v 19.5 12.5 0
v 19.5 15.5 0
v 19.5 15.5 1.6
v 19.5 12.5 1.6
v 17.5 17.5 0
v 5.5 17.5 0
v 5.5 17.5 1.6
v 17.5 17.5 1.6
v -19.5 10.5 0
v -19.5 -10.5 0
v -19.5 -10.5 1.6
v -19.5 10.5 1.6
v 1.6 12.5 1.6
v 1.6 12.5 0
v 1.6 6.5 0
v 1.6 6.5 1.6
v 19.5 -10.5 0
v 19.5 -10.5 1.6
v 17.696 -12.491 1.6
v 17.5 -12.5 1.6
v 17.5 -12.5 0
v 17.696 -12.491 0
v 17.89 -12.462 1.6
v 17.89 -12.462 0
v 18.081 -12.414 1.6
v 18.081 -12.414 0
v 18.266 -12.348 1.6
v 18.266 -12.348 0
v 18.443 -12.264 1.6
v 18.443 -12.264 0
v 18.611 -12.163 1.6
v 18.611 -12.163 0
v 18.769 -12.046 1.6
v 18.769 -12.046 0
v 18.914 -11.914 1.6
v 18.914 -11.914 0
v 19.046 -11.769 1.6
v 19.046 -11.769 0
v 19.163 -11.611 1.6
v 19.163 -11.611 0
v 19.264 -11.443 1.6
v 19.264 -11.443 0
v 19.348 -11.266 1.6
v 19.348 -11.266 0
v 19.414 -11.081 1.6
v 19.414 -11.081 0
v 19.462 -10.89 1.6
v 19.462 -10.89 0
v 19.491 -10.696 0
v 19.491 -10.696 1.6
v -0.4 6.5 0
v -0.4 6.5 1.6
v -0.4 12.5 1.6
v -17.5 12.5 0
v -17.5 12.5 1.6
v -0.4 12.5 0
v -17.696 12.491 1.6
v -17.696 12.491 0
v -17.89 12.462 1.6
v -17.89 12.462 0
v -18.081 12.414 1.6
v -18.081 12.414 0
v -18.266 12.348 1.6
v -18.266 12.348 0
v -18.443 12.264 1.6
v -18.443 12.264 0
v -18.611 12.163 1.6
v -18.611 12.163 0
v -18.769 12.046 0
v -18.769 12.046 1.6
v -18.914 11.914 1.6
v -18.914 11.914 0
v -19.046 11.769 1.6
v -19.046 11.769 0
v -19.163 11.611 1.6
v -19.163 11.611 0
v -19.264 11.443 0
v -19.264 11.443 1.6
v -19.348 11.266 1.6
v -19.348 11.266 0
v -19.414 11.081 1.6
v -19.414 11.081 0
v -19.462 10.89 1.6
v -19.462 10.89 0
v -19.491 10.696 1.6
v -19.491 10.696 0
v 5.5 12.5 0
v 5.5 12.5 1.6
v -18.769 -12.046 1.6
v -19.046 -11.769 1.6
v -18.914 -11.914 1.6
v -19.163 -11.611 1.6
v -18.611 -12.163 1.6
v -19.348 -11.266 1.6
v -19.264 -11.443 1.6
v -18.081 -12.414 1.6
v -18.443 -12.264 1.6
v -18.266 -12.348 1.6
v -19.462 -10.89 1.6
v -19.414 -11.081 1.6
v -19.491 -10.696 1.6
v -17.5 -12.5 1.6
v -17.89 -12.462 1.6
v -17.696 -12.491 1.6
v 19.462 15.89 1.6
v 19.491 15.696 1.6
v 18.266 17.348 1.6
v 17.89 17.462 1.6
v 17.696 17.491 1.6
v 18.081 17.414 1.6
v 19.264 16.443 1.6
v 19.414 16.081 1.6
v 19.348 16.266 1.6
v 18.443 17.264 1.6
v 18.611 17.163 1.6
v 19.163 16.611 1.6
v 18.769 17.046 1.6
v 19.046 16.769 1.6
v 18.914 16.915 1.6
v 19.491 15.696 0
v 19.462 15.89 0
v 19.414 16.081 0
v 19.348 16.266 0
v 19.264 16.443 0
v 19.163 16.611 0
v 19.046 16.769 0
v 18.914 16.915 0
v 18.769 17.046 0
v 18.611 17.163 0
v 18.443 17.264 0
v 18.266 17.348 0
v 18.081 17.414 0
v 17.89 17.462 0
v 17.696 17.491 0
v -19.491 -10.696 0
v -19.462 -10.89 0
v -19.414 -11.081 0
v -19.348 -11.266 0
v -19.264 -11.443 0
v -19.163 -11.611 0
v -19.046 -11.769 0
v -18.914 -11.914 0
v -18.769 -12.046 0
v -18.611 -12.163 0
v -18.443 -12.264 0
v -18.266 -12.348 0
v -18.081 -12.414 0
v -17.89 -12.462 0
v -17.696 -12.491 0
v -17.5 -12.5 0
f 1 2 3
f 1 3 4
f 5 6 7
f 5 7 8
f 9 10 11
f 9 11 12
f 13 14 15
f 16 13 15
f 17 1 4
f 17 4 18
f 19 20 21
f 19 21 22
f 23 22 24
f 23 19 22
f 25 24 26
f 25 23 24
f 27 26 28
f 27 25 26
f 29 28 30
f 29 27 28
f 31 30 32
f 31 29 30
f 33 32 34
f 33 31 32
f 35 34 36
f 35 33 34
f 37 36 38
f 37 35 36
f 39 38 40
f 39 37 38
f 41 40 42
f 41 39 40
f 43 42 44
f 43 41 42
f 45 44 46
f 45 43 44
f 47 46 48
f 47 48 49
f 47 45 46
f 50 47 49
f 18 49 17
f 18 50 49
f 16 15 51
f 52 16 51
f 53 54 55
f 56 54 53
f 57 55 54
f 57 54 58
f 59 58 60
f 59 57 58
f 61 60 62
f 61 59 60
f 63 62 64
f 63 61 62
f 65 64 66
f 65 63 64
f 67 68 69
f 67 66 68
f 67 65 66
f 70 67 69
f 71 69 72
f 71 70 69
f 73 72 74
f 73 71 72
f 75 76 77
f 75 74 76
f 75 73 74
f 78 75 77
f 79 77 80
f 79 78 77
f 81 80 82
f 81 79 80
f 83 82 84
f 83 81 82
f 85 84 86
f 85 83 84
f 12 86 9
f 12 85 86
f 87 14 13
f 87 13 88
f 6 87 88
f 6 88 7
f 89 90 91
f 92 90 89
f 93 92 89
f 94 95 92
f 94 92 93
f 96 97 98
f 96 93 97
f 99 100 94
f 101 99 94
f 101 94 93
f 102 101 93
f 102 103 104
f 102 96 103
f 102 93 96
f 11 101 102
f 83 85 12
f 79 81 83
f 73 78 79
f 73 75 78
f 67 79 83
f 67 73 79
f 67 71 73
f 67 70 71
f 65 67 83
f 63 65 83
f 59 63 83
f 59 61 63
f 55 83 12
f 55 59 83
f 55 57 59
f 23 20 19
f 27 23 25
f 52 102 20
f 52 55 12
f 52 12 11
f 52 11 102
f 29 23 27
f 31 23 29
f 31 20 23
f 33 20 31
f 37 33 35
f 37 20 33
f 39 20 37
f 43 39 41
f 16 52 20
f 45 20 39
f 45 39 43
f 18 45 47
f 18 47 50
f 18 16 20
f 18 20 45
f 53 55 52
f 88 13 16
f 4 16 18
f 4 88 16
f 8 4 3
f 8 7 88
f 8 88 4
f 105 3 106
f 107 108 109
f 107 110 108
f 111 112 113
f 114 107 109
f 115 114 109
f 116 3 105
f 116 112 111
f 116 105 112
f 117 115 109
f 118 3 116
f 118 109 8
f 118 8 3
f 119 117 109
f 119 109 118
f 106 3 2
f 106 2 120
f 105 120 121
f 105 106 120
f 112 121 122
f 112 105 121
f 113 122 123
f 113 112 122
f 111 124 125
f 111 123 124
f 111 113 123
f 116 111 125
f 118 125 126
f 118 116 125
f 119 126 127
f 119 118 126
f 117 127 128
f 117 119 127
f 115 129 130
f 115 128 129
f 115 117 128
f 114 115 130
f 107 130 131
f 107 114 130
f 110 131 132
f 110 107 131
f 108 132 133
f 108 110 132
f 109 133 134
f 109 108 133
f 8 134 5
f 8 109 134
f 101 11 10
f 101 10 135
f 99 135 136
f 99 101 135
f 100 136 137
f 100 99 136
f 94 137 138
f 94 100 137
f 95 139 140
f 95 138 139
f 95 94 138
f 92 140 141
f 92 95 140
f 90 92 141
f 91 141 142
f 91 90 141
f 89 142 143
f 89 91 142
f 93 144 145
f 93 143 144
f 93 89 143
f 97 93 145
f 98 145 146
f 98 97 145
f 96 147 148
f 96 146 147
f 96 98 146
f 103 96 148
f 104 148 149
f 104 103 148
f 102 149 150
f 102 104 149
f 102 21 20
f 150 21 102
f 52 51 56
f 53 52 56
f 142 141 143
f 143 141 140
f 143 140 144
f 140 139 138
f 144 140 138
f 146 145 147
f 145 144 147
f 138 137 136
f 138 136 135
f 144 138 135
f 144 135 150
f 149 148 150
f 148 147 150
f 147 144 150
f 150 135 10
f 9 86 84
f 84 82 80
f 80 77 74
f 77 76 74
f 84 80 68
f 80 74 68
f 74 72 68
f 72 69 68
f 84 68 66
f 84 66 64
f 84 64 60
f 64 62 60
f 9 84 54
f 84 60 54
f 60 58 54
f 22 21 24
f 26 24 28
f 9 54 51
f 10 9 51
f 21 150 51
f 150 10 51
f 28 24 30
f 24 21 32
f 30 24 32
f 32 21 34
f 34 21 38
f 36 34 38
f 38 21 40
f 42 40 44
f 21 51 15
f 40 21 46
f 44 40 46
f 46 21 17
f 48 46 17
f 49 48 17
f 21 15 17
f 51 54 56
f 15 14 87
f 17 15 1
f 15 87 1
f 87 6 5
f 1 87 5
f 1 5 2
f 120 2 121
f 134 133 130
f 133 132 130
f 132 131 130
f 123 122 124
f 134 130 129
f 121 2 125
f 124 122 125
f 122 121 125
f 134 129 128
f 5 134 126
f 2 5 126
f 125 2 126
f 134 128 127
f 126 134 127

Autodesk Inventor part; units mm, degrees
ref_plane "YZ Plane" through (0, 0, 0) normal (1, 0, 0) x (0, 1, 0)
ref_plane "XZ Plane" through (0, 0, 0) normal (0, 1, 0) x (-1, 0, 0)
ref_plane "XY Plane" through (0, 0, 0) normal (0, 0, 1) x (1, 0, 0)
sketch "Sketch5" plane through (0, 0, 0) normal (0, 0, 1) x (1, 0, 0)
  line L0 (19.5002, -12.5002) -> (-19.5002, -12.5002)
  line L1 (-19.5002, -12.5002) -> (-19.5002, 12.5002)
  line L2 (19.5002, 12.5002) -> (19.5002, -12.5002)
  line L3 (19.5002, -12.5002) -> (-19.5002, 12.5002) construction
  line L4 (-19.5002, -12.5002) -> (19.5002, 12.5002) construction
  line L5 (1.6, 6.4998) -> (-0.4, 6.4998)
  line L6 (-0.4, 6.4998) -> (-0.4, 12.5002)
  line L7 (1.6, 12.5002) -> (1.6, 6.4998)
  line L8 (1.6, 6.4998) -> (-0.4, 12.5002) construction
  line L9 (-0.4, 6.4998) -> (1.6, 12.5002) construction
  line L10 (5.4998, 12.5002) -> (5.4998, 17.5003)
  line L11 (5.4998, 17.5003) -> (19.5002, 17.5003)
  line L12 (19.5002, 17.5003) -> (19.5002, 12.5002)
  line L13 (-19.5002, 12.5002) -> (-0.4, 12.5002)
  line L14 (1.6, 12.5002) -> (5.4998, 12.5002)
extrude "Extrusion4" add sketch "Sketch5" along normal blind 1.6
fillet "Fillet4" radius 2 4 edges at (19.5002, 17.5003, 0.8) (-19.5002, 12.5002, 0.8) (19.5002, -12.5002, 0.8) (-19.5002, -12.5002, 0.8)
properties part number "pcb_balun_bottom"
